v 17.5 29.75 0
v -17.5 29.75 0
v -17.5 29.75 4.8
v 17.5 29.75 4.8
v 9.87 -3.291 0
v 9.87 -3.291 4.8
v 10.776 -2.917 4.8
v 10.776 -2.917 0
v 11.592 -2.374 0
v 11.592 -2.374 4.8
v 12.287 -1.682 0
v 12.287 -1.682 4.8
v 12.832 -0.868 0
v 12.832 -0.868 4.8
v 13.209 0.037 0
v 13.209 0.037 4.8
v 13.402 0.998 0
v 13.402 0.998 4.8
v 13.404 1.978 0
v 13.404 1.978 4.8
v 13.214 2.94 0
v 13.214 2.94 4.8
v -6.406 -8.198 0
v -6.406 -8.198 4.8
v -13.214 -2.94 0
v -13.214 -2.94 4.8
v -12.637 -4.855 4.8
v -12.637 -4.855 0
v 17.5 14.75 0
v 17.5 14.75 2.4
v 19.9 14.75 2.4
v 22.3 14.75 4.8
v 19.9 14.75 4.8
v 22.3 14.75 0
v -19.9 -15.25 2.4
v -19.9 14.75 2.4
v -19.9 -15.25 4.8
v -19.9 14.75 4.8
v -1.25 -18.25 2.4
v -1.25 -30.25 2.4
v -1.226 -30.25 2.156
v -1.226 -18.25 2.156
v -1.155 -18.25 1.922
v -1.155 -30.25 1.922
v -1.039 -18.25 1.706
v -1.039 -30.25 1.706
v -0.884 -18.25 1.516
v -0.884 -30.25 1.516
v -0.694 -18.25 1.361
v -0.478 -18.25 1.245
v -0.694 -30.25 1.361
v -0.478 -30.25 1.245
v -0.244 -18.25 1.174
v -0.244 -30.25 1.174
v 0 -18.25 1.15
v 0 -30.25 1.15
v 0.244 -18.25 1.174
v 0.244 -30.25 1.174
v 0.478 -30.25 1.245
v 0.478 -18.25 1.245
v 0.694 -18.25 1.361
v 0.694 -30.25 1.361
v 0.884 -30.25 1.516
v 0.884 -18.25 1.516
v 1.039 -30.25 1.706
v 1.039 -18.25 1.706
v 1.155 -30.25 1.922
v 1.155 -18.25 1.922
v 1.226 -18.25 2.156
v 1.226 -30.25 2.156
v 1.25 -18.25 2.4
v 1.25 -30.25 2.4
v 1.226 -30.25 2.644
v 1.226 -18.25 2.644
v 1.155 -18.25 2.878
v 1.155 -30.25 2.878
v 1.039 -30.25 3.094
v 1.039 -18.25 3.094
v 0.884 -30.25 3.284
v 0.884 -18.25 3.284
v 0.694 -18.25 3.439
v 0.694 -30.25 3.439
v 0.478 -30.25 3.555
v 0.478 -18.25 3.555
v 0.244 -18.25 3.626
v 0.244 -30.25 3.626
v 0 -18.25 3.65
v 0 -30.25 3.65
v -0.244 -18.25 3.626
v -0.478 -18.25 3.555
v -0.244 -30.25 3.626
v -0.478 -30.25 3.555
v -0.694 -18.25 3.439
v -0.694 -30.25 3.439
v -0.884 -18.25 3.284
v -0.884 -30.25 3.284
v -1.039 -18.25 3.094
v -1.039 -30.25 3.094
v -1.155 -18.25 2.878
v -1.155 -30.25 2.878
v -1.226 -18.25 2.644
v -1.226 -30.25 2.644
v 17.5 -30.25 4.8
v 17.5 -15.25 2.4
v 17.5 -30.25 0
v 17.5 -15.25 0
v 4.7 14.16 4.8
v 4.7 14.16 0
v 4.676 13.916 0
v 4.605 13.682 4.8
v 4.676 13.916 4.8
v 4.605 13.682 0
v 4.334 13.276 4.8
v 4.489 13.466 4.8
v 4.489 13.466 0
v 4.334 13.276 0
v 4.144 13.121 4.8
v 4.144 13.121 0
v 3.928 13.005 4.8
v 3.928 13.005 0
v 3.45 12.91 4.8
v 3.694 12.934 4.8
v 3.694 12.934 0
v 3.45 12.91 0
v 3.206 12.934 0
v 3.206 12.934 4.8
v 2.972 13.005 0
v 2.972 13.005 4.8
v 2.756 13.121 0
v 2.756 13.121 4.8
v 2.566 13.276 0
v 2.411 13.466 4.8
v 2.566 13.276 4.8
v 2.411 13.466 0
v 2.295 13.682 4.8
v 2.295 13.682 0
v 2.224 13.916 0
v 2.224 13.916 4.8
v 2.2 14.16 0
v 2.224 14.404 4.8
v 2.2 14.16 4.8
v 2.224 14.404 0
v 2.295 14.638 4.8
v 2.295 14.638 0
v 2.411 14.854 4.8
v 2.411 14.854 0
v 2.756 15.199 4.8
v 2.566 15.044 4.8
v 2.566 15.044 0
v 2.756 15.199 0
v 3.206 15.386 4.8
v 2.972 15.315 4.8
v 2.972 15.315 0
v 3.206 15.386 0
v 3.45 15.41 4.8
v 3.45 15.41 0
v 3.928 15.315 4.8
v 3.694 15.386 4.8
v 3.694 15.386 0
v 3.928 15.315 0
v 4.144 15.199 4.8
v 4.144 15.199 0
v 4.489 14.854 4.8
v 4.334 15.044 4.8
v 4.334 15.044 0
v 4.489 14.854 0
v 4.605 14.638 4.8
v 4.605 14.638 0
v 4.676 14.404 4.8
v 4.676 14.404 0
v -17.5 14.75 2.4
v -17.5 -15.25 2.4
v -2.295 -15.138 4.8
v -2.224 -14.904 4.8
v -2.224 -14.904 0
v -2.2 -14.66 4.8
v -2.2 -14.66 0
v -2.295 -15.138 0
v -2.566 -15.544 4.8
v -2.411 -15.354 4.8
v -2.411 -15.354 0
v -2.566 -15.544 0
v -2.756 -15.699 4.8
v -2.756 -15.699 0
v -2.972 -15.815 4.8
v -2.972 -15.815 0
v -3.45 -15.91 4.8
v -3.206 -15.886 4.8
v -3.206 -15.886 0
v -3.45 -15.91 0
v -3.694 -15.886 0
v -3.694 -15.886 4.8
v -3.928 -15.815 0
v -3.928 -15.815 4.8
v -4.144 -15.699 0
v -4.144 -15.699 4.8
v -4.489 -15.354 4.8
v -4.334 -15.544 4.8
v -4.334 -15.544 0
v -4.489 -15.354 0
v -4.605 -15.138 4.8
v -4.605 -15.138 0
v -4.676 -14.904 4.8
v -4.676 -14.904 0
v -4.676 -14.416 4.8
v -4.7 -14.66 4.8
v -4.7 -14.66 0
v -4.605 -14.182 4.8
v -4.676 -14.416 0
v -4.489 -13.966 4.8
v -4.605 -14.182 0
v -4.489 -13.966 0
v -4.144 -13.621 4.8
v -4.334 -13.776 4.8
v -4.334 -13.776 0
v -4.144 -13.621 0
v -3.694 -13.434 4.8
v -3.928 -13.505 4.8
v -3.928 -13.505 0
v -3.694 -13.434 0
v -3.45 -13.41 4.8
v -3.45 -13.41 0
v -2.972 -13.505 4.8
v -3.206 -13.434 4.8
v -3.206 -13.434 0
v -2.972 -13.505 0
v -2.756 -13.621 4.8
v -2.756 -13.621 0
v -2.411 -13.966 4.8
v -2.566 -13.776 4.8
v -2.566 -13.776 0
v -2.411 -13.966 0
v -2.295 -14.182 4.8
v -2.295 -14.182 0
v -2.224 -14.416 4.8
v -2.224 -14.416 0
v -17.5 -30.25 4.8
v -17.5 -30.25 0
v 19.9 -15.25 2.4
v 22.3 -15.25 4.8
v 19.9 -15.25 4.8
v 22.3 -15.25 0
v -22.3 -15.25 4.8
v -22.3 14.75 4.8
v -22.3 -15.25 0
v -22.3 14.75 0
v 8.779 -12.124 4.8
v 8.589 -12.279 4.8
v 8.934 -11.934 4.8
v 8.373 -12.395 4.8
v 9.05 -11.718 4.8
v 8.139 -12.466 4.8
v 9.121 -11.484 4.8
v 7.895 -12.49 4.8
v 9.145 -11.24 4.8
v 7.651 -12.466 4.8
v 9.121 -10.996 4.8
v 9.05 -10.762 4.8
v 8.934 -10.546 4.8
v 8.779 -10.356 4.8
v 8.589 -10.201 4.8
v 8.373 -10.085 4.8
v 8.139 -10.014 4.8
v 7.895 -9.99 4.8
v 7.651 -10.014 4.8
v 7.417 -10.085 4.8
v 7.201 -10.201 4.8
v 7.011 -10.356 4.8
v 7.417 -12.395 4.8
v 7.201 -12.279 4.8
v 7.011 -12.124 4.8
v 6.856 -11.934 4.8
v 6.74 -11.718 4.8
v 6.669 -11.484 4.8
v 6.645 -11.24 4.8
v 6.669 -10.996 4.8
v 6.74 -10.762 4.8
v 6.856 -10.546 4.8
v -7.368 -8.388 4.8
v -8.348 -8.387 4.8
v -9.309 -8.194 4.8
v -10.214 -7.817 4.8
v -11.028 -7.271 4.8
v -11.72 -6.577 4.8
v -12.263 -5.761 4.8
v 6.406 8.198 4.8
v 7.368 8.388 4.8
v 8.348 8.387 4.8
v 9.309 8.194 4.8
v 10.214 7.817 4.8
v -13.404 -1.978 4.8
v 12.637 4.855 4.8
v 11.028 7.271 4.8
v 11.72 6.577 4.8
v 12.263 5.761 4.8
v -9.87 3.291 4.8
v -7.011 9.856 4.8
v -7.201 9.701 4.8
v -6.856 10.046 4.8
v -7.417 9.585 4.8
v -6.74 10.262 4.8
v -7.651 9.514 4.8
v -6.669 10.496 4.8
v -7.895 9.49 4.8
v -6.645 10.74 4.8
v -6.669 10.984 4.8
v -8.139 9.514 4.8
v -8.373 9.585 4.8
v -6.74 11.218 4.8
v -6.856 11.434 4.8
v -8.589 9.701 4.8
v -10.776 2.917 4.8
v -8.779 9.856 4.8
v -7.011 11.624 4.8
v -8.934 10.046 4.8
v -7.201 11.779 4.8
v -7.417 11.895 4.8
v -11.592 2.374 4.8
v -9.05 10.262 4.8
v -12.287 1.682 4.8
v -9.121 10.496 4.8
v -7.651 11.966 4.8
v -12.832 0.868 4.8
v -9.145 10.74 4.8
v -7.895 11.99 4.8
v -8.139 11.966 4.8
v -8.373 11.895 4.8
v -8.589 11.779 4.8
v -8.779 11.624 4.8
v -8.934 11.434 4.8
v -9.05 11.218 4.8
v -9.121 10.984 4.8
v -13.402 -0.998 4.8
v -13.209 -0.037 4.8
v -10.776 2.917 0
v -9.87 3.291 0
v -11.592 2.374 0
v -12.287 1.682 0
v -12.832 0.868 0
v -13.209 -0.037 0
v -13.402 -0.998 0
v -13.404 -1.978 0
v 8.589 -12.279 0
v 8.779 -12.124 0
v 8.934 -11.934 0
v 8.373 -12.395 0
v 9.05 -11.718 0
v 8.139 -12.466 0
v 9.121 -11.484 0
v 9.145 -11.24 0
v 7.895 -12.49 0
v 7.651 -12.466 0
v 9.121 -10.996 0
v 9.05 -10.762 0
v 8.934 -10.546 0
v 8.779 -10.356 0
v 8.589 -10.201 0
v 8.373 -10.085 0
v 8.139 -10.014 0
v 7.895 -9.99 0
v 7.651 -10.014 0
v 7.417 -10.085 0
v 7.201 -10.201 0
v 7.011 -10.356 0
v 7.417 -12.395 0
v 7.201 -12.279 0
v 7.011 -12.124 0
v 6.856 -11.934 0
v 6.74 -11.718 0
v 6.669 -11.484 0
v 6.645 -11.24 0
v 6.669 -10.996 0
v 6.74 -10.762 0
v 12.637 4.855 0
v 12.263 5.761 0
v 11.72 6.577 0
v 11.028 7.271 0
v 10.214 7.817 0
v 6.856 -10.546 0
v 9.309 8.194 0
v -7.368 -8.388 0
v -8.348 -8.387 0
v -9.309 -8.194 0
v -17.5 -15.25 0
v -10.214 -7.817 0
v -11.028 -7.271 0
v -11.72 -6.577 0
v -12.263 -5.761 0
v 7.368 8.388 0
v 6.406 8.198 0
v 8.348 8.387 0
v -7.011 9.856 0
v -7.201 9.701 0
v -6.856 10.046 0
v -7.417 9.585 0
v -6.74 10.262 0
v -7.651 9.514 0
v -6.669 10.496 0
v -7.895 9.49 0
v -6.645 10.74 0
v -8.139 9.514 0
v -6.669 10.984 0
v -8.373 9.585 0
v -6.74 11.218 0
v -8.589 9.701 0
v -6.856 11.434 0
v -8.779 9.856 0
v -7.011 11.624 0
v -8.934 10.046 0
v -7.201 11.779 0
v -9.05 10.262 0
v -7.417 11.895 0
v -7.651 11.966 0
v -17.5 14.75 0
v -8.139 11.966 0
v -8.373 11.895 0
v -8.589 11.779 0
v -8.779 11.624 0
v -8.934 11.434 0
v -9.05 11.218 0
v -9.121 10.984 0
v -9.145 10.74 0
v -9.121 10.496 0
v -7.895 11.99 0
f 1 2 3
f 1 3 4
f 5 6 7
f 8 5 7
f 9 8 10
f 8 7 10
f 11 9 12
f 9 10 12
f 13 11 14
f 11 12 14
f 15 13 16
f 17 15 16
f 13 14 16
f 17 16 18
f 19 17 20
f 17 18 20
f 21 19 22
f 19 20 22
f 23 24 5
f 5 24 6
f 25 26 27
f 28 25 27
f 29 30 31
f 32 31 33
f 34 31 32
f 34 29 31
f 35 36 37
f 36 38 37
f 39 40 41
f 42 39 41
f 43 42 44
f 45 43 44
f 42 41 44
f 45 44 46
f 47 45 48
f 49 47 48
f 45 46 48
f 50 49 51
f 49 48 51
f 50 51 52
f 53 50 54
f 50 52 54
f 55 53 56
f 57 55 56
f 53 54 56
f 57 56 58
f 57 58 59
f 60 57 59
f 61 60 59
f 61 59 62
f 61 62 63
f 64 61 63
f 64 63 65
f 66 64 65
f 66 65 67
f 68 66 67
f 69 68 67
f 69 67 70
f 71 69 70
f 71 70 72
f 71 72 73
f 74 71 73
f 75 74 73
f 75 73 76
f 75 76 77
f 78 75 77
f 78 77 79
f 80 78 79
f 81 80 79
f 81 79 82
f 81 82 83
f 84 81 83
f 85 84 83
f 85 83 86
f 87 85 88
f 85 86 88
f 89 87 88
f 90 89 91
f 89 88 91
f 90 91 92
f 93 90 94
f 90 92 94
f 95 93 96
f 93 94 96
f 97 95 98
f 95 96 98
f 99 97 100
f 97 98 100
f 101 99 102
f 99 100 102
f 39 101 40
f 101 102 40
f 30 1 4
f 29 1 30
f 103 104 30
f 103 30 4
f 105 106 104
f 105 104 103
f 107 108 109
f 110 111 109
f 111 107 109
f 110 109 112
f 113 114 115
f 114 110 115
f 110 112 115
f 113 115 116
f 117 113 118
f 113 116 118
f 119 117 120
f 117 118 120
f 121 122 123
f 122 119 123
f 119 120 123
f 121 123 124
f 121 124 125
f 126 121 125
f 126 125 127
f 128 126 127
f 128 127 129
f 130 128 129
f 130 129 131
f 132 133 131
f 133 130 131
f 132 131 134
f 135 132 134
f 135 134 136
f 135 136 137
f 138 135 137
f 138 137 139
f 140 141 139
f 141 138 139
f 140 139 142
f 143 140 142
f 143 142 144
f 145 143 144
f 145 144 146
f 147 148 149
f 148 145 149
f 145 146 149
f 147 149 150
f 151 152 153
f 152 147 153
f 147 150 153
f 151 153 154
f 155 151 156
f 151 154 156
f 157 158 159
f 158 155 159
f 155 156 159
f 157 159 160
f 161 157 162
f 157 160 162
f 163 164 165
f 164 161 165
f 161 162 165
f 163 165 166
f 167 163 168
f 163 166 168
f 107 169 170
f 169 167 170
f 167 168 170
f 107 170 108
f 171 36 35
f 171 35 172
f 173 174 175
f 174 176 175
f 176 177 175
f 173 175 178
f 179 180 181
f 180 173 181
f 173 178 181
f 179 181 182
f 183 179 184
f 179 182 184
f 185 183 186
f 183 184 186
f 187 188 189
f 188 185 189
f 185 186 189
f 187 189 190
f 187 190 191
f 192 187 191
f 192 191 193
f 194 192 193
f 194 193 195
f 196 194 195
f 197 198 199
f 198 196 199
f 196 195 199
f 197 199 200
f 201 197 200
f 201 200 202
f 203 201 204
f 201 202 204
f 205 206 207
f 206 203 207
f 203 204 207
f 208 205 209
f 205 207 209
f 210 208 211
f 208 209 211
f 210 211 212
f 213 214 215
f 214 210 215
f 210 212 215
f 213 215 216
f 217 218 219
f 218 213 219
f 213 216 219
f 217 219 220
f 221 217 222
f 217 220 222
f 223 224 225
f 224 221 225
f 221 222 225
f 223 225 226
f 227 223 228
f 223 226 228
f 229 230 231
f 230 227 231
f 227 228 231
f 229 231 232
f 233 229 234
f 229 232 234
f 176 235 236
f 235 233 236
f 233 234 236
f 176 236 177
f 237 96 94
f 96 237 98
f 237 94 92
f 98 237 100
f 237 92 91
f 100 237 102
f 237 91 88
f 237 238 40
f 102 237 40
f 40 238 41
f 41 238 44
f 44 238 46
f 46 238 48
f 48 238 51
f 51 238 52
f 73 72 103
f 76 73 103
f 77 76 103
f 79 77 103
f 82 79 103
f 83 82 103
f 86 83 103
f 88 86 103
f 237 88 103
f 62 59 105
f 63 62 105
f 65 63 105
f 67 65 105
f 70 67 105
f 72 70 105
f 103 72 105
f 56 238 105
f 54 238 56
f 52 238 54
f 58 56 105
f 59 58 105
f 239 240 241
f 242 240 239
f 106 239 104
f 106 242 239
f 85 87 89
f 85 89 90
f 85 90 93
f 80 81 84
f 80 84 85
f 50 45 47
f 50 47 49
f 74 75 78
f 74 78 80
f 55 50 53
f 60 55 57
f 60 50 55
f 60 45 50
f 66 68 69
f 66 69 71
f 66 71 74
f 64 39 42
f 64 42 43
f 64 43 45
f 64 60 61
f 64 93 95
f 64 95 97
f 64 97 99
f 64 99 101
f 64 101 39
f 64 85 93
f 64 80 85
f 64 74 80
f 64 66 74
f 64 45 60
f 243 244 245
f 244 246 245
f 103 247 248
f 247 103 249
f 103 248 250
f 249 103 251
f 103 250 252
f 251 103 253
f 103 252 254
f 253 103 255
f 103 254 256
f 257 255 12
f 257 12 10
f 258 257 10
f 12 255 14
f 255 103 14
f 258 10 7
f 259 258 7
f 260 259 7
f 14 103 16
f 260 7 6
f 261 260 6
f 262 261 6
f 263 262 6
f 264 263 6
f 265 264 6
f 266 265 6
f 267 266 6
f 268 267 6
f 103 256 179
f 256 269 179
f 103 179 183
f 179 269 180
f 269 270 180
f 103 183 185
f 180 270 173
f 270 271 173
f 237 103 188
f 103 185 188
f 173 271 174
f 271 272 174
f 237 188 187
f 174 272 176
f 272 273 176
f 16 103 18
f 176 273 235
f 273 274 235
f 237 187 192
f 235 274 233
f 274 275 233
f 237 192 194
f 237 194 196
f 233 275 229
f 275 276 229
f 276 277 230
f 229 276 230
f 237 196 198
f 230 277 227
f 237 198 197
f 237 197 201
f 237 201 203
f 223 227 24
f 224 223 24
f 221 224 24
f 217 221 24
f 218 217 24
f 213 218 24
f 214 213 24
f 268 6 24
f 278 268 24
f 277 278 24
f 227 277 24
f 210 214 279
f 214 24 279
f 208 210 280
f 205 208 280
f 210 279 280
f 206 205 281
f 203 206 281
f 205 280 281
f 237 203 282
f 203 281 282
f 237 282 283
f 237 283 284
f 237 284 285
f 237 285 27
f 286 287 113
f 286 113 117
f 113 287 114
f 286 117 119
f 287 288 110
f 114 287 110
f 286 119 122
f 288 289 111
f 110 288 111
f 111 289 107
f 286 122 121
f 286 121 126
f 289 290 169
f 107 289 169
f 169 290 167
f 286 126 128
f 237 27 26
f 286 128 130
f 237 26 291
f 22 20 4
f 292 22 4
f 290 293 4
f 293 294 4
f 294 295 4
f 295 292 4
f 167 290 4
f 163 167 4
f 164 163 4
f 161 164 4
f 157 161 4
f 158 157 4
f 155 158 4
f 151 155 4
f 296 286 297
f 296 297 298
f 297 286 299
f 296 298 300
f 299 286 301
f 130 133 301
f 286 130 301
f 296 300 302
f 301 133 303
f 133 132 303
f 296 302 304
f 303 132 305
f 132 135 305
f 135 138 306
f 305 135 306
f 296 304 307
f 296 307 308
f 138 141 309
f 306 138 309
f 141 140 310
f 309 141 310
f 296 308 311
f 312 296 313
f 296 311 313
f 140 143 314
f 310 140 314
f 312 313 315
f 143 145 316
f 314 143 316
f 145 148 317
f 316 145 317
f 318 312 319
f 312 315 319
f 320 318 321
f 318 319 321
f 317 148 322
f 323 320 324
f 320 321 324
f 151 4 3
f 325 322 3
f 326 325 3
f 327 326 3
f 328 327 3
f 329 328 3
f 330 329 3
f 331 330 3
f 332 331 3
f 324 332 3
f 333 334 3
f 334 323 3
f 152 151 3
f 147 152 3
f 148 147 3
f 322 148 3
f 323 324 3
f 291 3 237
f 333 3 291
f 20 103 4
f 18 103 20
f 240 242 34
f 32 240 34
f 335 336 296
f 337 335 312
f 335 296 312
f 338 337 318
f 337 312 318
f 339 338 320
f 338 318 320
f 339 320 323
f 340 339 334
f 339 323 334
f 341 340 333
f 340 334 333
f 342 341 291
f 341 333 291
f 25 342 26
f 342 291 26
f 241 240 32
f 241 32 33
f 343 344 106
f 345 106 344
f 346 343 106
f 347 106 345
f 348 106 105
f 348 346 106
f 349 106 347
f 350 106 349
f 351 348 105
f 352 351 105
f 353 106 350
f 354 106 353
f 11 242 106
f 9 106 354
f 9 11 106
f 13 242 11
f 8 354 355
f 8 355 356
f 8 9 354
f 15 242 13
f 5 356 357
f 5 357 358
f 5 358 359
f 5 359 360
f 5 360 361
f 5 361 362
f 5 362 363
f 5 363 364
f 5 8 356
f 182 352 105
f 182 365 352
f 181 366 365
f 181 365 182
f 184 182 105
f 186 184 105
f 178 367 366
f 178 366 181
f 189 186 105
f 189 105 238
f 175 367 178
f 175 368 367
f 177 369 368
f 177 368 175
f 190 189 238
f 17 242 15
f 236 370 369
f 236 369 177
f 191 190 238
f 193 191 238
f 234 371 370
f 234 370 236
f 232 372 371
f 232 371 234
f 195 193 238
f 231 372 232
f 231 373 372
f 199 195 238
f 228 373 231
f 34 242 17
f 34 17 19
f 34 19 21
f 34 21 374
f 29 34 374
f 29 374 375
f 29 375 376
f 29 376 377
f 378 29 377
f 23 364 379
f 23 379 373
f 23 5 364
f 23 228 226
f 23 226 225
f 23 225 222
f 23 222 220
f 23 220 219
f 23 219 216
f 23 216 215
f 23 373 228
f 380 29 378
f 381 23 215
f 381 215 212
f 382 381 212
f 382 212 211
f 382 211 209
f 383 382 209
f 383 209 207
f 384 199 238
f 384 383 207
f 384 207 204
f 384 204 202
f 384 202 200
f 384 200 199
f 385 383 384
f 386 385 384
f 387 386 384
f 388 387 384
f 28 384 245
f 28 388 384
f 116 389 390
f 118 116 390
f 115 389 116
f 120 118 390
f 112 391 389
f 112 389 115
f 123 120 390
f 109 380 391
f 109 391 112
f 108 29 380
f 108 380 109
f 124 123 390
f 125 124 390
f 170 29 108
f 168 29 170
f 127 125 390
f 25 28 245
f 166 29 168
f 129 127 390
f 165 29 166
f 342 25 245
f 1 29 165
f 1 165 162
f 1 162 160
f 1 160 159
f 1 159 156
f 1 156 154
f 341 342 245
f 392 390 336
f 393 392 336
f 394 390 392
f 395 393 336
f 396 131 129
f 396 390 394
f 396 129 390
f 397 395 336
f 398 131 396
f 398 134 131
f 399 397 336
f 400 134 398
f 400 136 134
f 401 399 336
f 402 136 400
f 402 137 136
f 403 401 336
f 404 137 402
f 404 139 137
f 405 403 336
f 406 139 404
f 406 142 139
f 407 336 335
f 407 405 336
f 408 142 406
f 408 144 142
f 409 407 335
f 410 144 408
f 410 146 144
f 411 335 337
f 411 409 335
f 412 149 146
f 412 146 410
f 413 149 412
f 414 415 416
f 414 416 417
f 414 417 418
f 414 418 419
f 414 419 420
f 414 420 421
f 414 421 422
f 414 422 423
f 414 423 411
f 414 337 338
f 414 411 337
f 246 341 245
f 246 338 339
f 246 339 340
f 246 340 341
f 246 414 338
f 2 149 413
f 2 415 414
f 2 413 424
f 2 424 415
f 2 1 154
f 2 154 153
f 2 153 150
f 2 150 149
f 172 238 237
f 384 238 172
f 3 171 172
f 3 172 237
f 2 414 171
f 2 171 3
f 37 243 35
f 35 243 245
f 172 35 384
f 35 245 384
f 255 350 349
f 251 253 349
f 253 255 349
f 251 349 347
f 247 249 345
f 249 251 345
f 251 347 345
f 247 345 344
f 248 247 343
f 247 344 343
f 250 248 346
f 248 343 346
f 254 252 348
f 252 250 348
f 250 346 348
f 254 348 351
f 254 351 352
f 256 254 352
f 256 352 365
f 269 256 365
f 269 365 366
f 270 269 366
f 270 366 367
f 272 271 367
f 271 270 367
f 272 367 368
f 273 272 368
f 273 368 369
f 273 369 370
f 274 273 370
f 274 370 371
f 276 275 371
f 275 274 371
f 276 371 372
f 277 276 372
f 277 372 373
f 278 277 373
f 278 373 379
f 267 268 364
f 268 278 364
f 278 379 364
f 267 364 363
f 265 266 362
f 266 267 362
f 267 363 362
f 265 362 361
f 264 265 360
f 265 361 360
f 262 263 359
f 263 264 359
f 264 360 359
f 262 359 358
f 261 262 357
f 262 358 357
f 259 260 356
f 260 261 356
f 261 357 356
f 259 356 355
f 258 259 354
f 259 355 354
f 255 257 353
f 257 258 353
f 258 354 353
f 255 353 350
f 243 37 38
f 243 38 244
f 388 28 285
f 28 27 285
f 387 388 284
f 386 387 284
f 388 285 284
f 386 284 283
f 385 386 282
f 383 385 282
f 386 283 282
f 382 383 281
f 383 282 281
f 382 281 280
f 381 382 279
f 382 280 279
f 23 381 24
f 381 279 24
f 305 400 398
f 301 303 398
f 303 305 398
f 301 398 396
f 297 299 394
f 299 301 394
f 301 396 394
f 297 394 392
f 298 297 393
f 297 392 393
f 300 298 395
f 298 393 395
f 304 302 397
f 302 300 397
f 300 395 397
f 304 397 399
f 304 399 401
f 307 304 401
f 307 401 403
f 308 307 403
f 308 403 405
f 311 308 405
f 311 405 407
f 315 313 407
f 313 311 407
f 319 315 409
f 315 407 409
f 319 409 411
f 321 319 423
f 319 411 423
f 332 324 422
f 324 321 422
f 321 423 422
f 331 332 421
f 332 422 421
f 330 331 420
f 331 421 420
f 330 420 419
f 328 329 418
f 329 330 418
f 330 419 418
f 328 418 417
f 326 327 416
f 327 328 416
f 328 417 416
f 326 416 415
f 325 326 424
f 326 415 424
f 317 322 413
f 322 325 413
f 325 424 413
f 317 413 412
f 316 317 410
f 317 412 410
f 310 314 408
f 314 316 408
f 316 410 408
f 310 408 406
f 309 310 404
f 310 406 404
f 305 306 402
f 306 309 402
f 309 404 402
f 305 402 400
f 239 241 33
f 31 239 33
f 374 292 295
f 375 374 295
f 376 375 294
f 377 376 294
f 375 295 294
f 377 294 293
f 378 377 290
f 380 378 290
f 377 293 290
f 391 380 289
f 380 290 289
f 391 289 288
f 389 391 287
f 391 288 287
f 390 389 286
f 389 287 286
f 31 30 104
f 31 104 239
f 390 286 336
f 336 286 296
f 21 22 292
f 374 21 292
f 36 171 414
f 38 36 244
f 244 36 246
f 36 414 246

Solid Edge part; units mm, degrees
sketch "Sketch1" plane through (0, 0, 0) normal (0, 0, 1) x (1, 0, 0)
  line L0 (-17.5, 29.75) -> (17.5, 29.75)
  line L1 (17.5, 29.75) -> (17.5, 14.75)
  line L2 (17.5, 14.75) -> (22.3, 14.75)
  line L3 (22.3, -0.25) -> (22.3, 14.75)
  line L4 (22.3, -0.25) -> (22.3, -15.25)
  line L5 (22.3, -15.25) -> (17.5, -15.25)
  line L6 (17.5, -30.25) -> (17.5, -15.25)
  line L7 (-17.5, -30.25) -> (17.5, -30.25)
  line L8 (-17.5, -15.25) -> (-17.5, -30.25)
  line L9 (-22.3, -15.25) -> (-17.5, -15.25)
  line L10 (-22.3, -0.25) -> (-22.3, -15.25)
  line L11 (-22.3, -0.25) -> (-22.3, 14.75)
  line L12 (-17.5, 14.75) -> (-22.3, 14.75)
  line L13 (-17.5, 14.75) -> (-17.5, 29.75)
  circle A0 centre (3.45, 14.16) radius 1.25
  circle A1 centre (-7.895, 10.74) radius 1.25
  circle A2 centre (-3.45, -14.66) radius 1.25
  circle A3 centre (7.895, -11.24) radius 1.25
  dimension "D1" = 30
  dimension "D2" = 15
  dimension "D3" = 35
  dimension "D4" = 15
extrude "ExtrudedProtrusion_6" add sketch "Sketch1" along normal blind 4.8
sketch "Sketch2" plane through (0, 0, 4.8) normal (0, 0, 1) x (1, 0, 0)
  line L0 (-19.9, 14.75) -> (-19.9, -15.25)
  line L1 (-19.9, -15.25) -> (-17.5, -15.25)
  line L2 (-17.5, -15.25) -> (-17.5, 14.75)
  line L3 (-17.5, 14.75) -> (-19.9, 14.75)
  line L4 (19.9, -15.25) -> (19.9, 14.75)
  line L5 (19.9, 14.75) -> (17.5, 14.75)
  line L6 (17.5, 14.75) -> (17.5, -15.25)
  line L7 (17.5, -15.25) -> (19.9, -15.25)
extrude "ExtrudedCutout_5" cut sketch "Sketch2" against normal blind 2.4
sketch "Sketch3" plane through (0, -0.25, 4.8) normal (0, 0, 1) x (1, 0, 0)
  line L0 (6.4059, 8.4485) -> (-9.8703, 3.5406)
  arc A0 (-13.2139, -2.69) -> (-9.8703, 3.5406) centre (-8.4268, -1.2465) cw
  line L1 (-13.2139, -2.69) -> (-12.6365, -4.6048)
  arc A1 (-12.6365, -4.6048) -> (-6.4059, -7.9485) centre (-7.8494, -3.1614) ccw
  line L2 (-6.4059, -7.9485) -> (9.8703, -3.0406)
  arc A2 (9.8703, -3.0406) -> (13.2139, 3.19) centre (8.4268, 1.7465) ccw
  line L3 (13.2139, 3.19) -> (12.6365, 5.1048)
  arc A3 (6.4059, 8.4485) -> (12.6365, 5.1048) centre (7.8494, 3.6614) cw
extrude "ExtrudedCutout_7" cut sketch "Sketch3" against normal blind 5
sketch "Sketch4" plane through (0, -30.25, 2.4) normal (0, -1, 0) x (-1, 0, 0)
  circle A0 centre (0, 0) radius 1.25
extrude "ExtrudedCutout_8" cut sketch "Sketch4" against normal blind 12
properties material "Polycarbonate"
